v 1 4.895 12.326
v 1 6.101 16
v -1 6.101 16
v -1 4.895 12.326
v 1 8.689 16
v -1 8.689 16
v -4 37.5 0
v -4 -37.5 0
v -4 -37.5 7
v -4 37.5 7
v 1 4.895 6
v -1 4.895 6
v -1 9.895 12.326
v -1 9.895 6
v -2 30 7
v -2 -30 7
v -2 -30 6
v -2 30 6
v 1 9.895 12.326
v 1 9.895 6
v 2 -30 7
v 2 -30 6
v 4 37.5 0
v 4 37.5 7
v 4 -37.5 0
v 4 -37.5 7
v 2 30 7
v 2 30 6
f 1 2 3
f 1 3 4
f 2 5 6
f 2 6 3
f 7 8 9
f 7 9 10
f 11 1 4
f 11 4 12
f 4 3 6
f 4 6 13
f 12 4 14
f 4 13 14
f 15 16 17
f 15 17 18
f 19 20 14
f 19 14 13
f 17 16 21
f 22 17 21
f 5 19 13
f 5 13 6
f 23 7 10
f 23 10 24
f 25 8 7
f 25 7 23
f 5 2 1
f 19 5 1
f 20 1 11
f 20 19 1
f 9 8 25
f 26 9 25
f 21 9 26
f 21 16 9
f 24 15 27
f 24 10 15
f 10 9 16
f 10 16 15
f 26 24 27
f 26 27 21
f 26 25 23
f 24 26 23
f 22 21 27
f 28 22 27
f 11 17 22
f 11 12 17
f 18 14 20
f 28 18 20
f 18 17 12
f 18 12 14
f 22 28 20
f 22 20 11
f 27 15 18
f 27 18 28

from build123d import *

# Parameters (mm, degrees)
SKETCH1_W           = 8
SKETCH1_H           = 75
BOSS_EXTRUDE1_DEPTH = 7
SKETCH2_W           = 4
SKETCH2_H           = 60
CUT_EXTRUDE1_DEPTH  = 1
BOSS_EXTRUDE2_DEPTH = 1


with BuildPart() as part:
    # Sketch1 → Boss-Extrude1 (new body)
    with BuildSketch(Plane.XY):
        Rectangle(SKETCH1_W, SKETCH1_H)
    extrude(amount=BOSS_EXTRUDE1_DEPTH)

    # Sketch2 → Cut-Extrude1 (cut)
    with BuildSketch(Plane.XY.offset(7)):
        Rectangle(SKETCH2_W, SKETCH2_H)
    extrude(amount=-CUT_EXTRUDE1_DEPTH, mode=Mode.SUBTRACT)

    # Sketch3 → Boss-Extrude2 (add, symmetric)
    with BuildSketch(Plane(origin=(0, 0, 0), x_dir=(0, 0, -1), z_dir=(1, 0, 0))):
        Polygon((-5.362926248, 9.895130651), (-12.32555201, 9.895130651), (-16, 8.689278514), (-16, 6.100982787), (-12.32555201, 4.895130651), (-5.362926248, 4.895130651), align=None)
    extrude(amount=BOSS_EXTRUDE2_DEPTH, both=True)


solid = part.part
